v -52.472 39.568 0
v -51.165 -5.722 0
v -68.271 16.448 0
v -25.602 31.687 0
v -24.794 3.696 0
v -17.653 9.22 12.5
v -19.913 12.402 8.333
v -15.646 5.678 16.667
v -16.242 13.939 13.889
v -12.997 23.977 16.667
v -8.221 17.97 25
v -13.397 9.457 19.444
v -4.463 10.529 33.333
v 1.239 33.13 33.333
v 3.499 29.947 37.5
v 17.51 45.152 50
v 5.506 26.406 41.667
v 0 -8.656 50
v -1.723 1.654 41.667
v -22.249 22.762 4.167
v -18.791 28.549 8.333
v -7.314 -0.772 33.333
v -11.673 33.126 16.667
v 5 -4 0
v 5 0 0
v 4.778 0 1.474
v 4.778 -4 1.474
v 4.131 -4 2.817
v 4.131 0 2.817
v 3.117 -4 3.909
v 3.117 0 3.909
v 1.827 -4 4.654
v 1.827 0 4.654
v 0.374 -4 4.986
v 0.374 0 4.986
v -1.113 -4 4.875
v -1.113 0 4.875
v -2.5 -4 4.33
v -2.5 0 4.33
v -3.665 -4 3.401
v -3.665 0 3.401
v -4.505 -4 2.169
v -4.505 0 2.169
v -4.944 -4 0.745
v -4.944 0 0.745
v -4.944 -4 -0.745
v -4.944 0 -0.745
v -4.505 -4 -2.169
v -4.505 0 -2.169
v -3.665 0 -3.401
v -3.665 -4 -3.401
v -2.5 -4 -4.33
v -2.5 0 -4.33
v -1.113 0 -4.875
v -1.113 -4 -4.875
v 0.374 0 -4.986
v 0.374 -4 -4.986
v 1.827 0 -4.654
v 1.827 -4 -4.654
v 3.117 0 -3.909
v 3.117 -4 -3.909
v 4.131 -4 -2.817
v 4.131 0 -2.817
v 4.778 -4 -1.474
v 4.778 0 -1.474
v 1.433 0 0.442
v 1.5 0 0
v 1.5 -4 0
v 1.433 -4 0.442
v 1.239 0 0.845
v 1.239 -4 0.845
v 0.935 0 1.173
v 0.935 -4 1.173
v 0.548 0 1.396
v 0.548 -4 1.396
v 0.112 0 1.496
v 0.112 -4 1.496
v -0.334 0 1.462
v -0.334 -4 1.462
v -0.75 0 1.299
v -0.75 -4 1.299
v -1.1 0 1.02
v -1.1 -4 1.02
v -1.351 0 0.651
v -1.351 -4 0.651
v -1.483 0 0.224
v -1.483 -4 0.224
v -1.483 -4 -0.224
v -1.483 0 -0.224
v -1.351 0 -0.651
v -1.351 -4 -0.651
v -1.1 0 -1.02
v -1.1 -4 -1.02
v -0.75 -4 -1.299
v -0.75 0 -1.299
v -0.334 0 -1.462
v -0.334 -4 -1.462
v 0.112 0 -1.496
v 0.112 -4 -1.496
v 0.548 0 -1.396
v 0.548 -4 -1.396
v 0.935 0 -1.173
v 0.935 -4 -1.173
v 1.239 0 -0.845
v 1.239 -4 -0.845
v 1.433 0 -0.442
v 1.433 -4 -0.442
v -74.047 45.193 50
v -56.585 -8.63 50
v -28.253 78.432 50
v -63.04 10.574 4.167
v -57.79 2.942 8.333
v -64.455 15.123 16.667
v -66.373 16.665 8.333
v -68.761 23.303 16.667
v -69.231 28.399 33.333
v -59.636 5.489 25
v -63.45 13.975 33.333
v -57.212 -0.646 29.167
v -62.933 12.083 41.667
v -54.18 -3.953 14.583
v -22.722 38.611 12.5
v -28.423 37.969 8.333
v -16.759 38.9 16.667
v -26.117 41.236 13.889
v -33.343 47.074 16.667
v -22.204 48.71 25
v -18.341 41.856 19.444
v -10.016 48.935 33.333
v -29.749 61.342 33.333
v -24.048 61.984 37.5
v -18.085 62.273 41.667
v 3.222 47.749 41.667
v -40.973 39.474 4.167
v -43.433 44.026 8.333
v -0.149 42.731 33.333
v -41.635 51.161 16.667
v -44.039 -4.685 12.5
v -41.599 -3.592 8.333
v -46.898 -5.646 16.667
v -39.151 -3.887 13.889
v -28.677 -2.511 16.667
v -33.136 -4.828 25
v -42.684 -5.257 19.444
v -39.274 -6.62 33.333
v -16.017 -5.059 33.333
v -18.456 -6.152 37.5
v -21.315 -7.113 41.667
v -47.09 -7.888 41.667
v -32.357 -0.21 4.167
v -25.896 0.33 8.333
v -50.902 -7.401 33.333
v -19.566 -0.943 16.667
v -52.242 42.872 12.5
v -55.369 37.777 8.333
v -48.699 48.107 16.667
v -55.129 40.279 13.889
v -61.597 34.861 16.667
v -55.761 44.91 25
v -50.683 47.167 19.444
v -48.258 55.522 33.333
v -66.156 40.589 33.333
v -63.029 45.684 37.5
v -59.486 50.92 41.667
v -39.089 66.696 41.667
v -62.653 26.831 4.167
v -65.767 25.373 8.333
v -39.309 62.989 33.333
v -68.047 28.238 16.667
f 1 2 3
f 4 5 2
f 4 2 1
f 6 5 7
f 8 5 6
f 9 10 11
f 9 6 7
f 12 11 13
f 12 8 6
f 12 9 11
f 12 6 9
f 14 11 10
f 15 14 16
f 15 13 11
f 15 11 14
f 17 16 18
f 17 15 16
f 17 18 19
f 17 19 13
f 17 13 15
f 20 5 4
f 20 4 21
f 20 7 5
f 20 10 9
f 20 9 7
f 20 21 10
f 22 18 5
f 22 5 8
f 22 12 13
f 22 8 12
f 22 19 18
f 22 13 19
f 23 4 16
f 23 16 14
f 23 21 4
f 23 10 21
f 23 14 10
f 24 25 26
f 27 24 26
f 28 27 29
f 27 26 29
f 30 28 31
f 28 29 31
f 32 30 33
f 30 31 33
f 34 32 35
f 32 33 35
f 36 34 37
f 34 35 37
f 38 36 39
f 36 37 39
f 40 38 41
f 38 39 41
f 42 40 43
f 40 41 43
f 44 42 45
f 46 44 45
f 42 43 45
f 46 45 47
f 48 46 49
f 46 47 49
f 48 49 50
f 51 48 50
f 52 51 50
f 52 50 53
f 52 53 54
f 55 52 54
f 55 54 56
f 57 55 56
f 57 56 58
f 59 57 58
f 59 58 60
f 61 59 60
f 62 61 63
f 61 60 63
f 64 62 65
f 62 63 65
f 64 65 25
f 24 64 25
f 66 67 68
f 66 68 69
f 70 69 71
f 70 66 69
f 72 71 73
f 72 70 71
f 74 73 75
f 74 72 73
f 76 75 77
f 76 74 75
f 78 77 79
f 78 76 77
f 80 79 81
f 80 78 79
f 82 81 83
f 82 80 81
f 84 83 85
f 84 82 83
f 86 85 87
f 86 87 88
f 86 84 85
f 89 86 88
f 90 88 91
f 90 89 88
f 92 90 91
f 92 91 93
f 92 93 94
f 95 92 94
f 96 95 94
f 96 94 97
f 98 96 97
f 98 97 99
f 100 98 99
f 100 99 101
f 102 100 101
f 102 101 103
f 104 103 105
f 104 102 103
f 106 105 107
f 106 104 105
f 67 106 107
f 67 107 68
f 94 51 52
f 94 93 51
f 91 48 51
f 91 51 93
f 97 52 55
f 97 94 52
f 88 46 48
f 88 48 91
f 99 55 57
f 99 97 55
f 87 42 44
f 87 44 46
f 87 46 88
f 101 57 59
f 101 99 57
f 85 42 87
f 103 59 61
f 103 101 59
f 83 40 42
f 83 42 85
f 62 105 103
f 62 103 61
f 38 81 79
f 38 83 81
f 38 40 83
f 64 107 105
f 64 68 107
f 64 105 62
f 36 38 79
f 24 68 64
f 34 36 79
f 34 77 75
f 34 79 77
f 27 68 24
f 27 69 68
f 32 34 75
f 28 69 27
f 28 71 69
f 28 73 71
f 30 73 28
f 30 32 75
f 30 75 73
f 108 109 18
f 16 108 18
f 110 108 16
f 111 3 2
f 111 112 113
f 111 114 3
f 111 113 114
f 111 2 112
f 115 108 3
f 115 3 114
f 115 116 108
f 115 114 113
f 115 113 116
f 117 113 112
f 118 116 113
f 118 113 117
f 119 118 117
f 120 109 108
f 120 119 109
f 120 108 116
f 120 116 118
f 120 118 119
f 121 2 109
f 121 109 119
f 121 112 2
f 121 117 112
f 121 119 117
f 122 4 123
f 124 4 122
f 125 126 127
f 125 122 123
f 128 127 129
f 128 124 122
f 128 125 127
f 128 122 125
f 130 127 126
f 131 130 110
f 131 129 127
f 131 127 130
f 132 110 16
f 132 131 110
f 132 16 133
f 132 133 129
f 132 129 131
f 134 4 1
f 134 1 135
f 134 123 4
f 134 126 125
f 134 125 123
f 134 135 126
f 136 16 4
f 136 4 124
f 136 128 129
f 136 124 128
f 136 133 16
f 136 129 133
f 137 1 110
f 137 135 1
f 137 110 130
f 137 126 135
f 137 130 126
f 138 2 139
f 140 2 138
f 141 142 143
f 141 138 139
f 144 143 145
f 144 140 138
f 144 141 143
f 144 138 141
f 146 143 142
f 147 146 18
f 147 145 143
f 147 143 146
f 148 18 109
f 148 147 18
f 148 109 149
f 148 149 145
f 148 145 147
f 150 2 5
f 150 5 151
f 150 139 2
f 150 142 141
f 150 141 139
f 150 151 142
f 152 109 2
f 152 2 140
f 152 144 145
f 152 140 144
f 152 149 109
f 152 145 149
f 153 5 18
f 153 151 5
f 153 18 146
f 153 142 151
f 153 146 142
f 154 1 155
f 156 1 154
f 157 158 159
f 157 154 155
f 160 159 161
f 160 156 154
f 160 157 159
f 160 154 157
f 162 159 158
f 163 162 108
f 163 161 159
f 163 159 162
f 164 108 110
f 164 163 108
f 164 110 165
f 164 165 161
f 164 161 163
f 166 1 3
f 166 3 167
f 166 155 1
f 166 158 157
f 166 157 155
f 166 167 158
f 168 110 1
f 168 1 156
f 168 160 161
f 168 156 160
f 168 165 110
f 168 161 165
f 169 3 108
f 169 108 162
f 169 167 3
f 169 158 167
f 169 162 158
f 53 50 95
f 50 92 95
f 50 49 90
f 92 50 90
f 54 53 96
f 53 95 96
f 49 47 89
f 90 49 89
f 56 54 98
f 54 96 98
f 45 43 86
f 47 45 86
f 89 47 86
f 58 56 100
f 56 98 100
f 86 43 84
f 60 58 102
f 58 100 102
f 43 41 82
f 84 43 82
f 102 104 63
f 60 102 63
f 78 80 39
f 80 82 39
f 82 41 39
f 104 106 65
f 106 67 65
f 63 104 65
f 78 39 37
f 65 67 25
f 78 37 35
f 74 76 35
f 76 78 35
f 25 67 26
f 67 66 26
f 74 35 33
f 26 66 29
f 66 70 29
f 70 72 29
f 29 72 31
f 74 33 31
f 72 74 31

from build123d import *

# Parameters (mm, degrees)
F0_R     = 5
F0_R_2   = 1.5
F1_DEPTH = 4


with BuildPart() as f1:
    # F0 (on Front) → F1 (new body)
    with BuildSketch(Plane.XZ):
        Circle(F0_R)
        Circle(F0_R_2, mode=Mode.SUBTRACT)
    extrude(amount=F1_DEPTH)


with BuildPart() as f5:
    # F2 (on Top) → F5 section 0
    with BuildSketch(Plane.XY):
        Polygon((-51.164737, -5.721761), (-24.793796, 3.696474), (-25.602001, 31.687124), (-52.47244, 39.568062), (-68.27108, 16.4481), align=None)
    # F4 (on offset) → F5 section 1
    with BuildSketch(Plane.XY.offset(50)):
        Polygon((-56.585082, -8.630357), (0, -8.655848), (17.509995, 45.151886), (-28.253315, 78.432385), (-74.04659, 45.193131), align=None)
    loft()


solid = Compound([f1.part, f5.part])
